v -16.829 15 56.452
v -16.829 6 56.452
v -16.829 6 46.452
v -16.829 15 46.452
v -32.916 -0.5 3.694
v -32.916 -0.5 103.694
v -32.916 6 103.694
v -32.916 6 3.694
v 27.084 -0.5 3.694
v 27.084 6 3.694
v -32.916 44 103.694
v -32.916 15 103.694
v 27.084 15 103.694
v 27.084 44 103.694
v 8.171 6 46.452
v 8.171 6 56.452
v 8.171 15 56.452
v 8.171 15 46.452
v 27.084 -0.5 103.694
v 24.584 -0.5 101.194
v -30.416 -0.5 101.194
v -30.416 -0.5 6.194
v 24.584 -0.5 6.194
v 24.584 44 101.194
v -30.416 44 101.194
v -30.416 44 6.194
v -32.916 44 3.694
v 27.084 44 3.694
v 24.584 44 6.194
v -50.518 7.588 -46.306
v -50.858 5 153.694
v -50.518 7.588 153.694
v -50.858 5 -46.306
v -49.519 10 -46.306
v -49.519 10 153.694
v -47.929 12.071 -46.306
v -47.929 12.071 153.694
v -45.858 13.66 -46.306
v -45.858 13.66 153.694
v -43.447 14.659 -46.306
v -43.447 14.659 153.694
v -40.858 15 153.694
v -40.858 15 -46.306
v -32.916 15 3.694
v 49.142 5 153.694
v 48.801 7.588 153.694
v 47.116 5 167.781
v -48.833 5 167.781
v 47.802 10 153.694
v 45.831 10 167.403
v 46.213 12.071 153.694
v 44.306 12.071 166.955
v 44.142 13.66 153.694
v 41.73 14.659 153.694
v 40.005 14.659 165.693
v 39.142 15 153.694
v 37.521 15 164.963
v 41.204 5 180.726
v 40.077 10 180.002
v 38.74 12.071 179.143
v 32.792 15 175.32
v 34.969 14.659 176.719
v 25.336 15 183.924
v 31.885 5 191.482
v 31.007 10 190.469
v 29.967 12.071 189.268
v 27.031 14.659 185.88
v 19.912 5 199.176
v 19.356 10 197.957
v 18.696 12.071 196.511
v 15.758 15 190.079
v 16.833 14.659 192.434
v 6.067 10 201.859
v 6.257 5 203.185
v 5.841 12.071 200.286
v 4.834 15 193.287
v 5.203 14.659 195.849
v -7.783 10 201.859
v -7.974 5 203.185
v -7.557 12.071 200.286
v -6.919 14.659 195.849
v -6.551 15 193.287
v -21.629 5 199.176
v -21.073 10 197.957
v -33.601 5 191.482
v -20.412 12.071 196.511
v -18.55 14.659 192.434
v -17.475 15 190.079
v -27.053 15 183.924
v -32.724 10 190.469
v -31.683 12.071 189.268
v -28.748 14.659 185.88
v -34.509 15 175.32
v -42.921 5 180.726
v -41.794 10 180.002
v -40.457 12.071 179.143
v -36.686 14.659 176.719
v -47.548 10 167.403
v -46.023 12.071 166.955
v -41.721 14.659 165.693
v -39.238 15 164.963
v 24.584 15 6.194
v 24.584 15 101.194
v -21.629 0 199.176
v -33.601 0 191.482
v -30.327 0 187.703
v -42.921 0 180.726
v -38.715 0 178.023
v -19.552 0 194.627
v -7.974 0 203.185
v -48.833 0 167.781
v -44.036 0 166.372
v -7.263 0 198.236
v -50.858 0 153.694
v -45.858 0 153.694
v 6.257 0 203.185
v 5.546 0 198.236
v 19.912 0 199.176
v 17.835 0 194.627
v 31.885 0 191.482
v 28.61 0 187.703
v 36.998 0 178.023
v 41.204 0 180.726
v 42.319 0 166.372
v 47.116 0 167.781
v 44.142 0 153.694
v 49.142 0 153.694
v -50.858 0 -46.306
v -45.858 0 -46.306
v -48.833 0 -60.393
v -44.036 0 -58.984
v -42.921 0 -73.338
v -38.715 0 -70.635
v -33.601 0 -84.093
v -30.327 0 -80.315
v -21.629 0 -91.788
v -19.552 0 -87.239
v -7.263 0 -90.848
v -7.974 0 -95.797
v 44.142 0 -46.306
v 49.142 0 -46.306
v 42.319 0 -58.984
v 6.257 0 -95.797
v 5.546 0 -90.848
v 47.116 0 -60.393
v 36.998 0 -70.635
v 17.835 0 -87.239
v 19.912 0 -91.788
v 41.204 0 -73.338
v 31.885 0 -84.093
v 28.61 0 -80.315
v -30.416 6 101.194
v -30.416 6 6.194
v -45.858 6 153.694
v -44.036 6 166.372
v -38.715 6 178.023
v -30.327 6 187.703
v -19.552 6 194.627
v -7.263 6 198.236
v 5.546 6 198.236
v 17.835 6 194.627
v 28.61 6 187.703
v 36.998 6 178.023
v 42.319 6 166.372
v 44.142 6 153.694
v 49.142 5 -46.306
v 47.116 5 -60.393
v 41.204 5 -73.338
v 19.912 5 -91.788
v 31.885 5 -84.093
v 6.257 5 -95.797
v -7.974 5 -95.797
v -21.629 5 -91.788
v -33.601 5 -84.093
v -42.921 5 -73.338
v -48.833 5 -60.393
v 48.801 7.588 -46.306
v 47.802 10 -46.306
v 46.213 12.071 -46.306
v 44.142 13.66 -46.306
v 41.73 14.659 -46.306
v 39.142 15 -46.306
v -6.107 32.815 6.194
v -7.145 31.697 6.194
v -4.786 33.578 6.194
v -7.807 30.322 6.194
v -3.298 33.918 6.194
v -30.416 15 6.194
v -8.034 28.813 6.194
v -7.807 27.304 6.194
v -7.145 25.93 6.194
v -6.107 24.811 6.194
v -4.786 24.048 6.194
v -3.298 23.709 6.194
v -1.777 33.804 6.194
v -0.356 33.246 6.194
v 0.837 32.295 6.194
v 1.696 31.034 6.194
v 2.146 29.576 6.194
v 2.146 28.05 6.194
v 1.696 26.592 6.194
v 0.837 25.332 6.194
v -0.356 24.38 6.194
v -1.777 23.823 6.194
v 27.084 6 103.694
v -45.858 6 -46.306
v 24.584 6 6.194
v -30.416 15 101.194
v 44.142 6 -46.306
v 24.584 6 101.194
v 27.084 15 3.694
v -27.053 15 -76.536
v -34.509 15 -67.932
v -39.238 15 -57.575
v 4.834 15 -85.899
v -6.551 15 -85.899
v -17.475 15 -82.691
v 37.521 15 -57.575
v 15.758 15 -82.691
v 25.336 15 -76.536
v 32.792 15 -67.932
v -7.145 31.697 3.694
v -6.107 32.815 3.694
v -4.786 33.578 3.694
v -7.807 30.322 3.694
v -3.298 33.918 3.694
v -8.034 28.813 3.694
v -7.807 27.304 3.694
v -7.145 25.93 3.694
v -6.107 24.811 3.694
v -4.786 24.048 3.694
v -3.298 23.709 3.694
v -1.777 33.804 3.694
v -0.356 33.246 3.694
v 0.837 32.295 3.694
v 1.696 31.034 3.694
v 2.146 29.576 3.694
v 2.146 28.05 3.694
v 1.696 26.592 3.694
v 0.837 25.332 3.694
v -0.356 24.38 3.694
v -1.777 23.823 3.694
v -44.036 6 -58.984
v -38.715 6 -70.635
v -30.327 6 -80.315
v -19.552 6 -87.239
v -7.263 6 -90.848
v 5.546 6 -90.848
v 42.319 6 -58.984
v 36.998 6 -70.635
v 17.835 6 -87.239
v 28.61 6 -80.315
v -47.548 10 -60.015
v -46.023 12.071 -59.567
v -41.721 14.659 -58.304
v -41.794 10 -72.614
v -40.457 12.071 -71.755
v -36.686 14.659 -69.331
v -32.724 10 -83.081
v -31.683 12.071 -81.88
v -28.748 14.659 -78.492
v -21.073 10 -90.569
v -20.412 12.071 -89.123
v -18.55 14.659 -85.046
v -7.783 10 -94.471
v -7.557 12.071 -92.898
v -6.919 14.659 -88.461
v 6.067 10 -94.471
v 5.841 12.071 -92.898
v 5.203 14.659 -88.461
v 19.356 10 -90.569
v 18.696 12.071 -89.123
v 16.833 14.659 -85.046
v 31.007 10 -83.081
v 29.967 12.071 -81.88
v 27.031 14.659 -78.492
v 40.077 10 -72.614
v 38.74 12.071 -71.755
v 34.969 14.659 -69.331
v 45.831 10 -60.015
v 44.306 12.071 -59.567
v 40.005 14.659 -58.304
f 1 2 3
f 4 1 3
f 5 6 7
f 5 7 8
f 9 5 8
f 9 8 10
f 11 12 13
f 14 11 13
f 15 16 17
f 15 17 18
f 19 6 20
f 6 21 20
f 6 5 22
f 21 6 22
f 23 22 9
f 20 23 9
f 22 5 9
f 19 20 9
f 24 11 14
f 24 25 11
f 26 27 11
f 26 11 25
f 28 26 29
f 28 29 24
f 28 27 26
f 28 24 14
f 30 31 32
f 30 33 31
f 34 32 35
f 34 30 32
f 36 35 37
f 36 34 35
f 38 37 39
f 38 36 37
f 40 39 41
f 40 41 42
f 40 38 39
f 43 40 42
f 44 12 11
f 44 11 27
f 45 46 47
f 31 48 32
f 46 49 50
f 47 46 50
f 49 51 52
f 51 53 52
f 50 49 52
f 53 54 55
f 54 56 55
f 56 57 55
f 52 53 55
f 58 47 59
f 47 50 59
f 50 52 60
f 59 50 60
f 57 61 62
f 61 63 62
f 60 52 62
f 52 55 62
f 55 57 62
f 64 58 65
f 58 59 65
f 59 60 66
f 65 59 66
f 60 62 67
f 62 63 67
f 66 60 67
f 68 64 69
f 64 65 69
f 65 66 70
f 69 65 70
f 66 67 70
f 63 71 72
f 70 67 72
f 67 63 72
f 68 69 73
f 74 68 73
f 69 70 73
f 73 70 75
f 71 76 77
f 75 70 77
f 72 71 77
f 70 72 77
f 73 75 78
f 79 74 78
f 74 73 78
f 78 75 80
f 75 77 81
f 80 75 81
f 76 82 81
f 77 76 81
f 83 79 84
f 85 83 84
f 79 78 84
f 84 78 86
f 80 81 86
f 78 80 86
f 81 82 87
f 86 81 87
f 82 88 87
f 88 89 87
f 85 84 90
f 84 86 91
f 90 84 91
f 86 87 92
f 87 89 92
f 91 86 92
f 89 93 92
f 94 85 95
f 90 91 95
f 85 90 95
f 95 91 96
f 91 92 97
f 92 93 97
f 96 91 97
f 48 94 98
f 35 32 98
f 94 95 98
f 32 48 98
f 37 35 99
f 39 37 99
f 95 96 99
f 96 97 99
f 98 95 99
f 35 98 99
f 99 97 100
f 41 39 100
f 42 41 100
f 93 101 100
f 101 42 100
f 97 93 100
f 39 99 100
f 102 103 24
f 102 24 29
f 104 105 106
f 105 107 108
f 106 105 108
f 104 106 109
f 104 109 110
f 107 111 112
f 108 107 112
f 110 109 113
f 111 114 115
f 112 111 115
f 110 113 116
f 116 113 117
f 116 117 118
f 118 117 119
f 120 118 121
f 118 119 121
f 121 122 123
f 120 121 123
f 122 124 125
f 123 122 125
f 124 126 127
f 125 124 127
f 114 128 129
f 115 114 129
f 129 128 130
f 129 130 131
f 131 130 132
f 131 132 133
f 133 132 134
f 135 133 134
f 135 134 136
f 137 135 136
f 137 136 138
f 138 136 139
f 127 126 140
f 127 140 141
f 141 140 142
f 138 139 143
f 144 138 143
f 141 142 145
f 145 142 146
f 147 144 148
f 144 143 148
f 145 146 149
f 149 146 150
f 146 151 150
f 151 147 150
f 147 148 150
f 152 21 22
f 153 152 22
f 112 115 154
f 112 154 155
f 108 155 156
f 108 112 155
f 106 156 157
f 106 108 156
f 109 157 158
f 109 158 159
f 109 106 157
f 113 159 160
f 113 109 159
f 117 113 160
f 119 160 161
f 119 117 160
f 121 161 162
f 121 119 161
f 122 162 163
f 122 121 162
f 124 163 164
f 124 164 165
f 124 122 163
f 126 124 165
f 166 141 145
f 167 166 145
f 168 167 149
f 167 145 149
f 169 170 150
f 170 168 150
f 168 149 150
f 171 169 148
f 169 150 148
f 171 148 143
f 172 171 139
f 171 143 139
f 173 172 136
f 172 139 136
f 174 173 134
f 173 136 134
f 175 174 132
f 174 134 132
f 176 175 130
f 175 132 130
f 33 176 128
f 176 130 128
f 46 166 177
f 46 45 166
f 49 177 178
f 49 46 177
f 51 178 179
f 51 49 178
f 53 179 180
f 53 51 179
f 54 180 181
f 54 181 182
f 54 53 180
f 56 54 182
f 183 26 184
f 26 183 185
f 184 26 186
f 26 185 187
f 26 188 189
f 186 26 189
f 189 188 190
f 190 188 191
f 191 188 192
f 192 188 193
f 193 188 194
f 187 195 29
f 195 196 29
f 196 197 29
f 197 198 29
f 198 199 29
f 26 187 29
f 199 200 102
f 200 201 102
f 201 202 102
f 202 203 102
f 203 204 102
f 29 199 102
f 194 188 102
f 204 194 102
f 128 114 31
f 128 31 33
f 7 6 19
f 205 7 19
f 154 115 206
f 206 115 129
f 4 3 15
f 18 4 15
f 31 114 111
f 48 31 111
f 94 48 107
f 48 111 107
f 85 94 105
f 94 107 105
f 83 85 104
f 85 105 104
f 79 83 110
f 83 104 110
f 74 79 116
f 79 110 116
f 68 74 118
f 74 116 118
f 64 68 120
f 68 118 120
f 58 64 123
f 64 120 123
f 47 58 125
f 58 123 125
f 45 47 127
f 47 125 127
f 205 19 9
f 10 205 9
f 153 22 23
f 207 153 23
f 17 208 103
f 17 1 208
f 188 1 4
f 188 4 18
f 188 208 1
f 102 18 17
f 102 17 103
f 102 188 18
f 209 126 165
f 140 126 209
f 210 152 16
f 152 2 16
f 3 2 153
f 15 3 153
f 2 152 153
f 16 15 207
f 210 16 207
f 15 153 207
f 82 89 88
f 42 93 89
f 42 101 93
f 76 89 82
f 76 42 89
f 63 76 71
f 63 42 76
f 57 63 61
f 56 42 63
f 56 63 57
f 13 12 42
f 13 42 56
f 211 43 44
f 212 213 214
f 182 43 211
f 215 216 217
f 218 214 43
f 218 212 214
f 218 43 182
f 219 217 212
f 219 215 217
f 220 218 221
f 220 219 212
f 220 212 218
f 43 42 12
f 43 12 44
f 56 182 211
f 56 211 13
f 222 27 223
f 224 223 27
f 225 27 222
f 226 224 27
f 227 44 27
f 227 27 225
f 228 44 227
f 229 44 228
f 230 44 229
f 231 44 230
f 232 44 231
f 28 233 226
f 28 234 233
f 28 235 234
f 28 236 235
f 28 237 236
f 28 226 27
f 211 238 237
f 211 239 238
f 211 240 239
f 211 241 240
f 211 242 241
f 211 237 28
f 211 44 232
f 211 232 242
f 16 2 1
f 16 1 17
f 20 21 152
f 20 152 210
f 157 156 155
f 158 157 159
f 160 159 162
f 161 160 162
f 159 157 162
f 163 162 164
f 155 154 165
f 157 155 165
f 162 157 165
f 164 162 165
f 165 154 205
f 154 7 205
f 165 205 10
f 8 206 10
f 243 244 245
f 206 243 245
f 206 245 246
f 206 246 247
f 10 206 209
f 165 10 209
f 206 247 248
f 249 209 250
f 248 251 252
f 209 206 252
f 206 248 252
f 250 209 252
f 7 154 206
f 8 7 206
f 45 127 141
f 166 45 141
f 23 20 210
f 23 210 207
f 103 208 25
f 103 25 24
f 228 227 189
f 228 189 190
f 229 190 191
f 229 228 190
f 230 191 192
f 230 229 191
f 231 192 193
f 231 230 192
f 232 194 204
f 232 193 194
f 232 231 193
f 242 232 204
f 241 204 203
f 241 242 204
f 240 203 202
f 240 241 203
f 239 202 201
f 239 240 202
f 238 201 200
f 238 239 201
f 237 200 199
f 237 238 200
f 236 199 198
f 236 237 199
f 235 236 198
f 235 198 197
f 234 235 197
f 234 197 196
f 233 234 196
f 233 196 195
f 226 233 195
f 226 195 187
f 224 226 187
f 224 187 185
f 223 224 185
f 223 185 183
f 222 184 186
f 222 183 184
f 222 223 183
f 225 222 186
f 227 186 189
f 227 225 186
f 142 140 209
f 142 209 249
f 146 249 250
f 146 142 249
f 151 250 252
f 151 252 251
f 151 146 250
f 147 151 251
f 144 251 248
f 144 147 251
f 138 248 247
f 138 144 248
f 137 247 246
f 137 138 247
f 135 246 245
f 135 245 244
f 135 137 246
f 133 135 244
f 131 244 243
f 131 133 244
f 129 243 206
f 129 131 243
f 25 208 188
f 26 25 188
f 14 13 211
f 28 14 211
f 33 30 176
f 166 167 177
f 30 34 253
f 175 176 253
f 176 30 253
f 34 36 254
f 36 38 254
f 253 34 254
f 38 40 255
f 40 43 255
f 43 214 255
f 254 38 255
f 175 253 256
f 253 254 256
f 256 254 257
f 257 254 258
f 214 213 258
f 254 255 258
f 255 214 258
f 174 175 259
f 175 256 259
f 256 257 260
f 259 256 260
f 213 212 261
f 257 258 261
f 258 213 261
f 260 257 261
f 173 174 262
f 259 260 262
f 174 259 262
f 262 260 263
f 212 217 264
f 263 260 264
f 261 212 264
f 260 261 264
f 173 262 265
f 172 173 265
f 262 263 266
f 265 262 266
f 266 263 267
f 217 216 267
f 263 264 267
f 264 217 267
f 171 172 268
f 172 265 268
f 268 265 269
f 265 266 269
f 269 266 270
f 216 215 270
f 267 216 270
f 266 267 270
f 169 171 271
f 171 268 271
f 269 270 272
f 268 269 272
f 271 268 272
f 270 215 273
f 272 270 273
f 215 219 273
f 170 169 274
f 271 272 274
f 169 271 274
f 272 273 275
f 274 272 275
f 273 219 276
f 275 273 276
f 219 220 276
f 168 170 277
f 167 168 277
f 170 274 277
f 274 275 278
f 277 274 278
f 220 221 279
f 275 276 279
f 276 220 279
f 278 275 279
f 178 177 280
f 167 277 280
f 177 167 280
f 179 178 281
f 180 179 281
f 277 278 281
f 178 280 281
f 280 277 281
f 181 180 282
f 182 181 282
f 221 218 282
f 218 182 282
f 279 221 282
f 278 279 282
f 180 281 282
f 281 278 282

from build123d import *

# Parameters (mm, degrees)
ESQUISSE1_R                  = 50
ESQUISSE1_W                  = 100
ESQUISSE1_H                  = 200
BOSS_EXTRU_2_DEPTH           = 15
CONG_3_R                     = 10
ENL_V_MAT_EXTRU_6_DEPTH      = 6
BOSS_EXTRU_3_DEPTH           = 44
BOSS_EXTRU_3_DEPTH_BACK      = 0.5
ESQUISSE1_6_W                = 55
ESQUISSE1_6_H                = 95
ENL_V_MAT_EXTRU_7_DEPTH      = 90
ENL_V_MAT_EXTRU_7_DEPTH_BACK = 131
ESQUISSE1_10_W               = 25
ESQUISSE1_10_H               = 10
ESQUISSE6_R                  = 5.118807206
ENL_V_MAT_EXTRU_8_DEPTH      = 13


with BuildPart() as part:
    # Esquisse1 → Boss.-Extru.2 (new body)
    with BuildSketch(Plane(origin=(0, 0, 0), x_dir=(1, 0, 0), z_dir=(0, 1, 0))):
        with Locations((-0.858369099, 46.305967004)):
            Circle(ESQUISSE1_R)
        with Locations((-0.858369099, -153.694032996)):
            Circle(ESQUISSE1_R)
        with Locations((-0.858369099, -53.694032996)):
            Rectangle(ESQUISSE1_W, ESQUISSE1_H)
    extrude(amount=BOSS_EXTRU_2_DEPTH)

    # Congé3
    cong_3_edges = [part.edges().sort_by_distance(p)[0] for p in [
        (-0.858369099, 15, -96.305967004),
        (-50.858369099, 15, 53.694032996),
        (-0.858369099, 15, 203.694032996),
        (49.141630901, 15, 53.694032996),
    ]]
    fillet(cong_3_edges, radius=CONG_3_R)

    # Esquisse1<5> → Enlèv. mat.-Extru.6 (cut)
    with BuildSketch(Plane(origin=(0, 0, 0), x_dir=(1, 0, 0), z_dir=(0, 1, 0))):
        with BuildLine():
            ThreePointArc((44.141630901, 46.305967004), (-0.858369099, 91.305967004), (-45.858369099, 46.305967004))
            Line((-45.858369099, 46.305967004), (-45.858369099, -153.694032996))
            ThreePointArc((-45.858369099, -153.694032996), (-0.858369099, -198.694032996), (44.141630901, -153.694032996))
            Line((44.141630901, -153.694032996), (44.141630901, 46.305967004))
        make_face()
    extrude(amount=ENL_V_MAT_EXTRU_6_DEPTH, mode=Mode.SUBTRACT)

    # Esquisse1<6> → Boss.-Extru.3 (add, two sides: drawn at the far end of the back side and taken through both)
    with BuildSketch(Plane(origin=(0, 0, 0), x_dir=(1, 0, 0), z_dir=(0, 1, 0)).offset(-BOSS_EXTRU_3_DEPTH_BACK)):
        Polygon((27.084452796, -3.694032996), (-0.858369099, -3.694032996), (-32.915547204, -3.694032996), (-32.915547204, -103.694032996), (-0.858368676, -103.694032996), (27.084452796, -103.694032996), align=None)
        with Locations((-2.915547204, -53.694032996)):
            Rectangle(ESQUISSE1_6_W, ESQUISSE1_6_H, mode=Mode.SUBTRACT)
    extrude(amount=BOSS_EXTRU_3_DEPTH + BOSS_EXTRU_3_DEPTH_BACK)

    # Esquisse1<10> → Enlèv. mat.-Extru.7 (cut, two sides: drawn at the far end of the back side and taken through both)
    with BuildSketch(Plane(origin=(0, 0, 0), x_dir=(1, 0, 0), z_dir=(0, 1, 0)).offset(-ENL_V_MAT_EXTRU_7_DEPTH_BACK)):
        with Locations((-4.32906887, -51.451666969)):
            Rectangle(ESQUISSE1_10_W, ESQUISSE1_10_H)
    extrude(amount=ENL_V_MAT_EXTRU_7_DEPTH + ENL_V_MAT_EXTRU_7_DEPTH_BACK, mode=Mode.SUBTRACT)

    # Esquisse6 → Enlèv. mat.-Extru.8 (cut)
    with BuildSketch(Plane.XY):
        with Locations((-2.915547204, 28.813279857)):
            Circle(ESQUISSE6_R)
    extrude(amount=ENL_V_MAT_EXTRU_8_DEPTH, mode=Mode.SUBTRACT)


solid = part.part
